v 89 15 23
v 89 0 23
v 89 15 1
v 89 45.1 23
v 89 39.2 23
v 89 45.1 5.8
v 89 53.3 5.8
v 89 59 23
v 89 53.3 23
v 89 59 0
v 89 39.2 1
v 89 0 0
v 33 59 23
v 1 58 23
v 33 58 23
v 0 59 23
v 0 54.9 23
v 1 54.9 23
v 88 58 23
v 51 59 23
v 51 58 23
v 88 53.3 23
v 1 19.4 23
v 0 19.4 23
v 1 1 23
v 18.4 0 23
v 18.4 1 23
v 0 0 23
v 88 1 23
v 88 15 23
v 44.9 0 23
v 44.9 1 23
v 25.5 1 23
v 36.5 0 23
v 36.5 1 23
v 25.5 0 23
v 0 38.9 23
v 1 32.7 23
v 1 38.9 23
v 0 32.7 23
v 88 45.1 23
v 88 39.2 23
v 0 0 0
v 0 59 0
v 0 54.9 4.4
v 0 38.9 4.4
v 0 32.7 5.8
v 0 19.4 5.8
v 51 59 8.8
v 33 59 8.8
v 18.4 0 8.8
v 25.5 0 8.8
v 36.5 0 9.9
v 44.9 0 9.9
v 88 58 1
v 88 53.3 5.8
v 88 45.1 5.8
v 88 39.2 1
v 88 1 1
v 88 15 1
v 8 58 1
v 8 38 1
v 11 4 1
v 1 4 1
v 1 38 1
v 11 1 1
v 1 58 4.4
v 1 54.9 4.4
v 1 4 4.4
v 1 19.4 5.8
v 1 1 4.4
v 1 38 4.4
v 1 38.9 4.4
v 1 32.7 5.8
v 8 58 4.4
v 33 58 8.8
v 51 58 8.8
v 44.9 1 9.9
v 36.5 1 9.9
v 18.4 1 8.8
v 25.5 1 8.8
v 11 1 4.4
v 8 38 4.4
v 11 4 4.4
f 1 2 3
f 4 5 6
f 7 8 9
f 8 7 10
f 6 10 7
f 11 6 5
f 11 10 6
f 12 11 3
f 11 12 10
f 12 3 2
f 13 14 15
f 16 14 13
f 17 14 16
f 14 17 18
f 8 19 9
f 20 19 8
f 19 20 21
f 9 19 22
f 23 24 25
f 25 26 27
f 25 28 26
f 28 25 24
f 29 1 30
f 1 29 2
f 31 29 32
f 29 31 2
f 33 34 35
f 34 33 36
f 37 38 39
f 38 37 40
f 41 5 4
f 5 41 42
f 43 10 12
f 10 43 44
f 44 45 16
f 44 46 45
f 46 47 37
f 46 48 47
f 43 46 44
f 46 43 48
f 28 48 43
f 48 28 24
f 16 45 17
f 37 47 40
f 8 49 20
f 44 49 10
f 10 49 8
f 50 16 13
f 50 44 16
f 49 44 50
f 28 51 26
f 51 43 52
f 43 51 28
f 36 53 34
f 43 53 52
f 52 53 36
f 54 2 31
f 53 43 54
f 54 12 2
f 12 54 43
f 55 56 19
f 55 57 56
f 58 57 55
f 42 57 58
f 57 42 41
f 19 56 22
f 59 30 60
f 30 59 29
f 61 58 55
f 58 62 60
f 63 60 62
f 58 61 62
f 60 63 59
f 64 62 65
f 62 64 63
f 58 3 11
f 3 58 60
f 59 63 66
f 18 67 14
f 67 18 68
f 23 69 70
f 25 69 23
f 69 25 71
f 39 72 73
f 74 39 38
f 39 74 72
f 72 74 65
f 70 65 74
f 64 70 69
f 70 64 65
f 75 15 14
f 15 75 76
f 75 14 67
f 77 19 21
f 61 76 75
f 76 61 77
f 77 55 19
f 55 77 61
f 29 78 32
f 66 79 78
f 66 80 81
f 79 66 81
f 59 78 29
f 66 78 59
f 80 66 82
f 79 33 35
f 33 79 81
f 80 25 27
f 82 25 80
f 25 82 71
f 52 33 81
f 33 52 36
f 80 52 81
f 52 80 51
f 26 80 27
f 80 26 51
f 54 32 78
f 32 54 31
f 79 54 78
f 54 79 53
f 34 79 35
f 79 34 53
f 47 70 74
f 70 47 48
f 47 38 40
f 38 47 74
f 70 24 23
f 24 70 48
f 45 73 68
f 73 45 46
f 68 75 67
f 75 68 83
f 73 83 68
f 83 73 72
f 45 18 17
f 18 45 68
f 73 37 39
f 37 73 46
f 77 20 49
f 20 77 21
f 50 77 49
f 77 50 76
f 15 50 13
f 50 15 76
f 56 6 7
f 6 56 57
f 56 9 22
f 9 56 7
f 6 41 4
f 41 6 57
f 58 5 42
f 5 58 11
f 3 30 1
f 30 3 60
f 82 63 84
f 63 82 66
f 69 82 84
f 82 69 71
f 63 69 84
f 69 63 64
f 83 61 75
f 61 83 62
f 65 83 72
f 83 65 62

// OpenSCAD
/*
 * Raspberry Pi Case
 *
 * Copyright 2012 <b@Zi.iS>
 * License CC BY 3.0
 */

base();

module base(
	wall = 1,
	height = 22,
	model = "B"
) {
	length = 87;
	width = 57;

	difference() {

		// Case
		cube([
			length + wall*2,
			width + wall*2,
			height + wall,
		]);

		// Hollow
		translate([
			wall,
			wall,
			wall
		]) {
			cube([
				length,
				width,
		 		height+1,
			]);
		}

		// Audio
		translate([
			wall+17.4,
			-wall,
			wall+3.4+4.4
		]) {
			cube([
				7.1,
				3*wall,
				50,
			]);
		}

		// Composite	
		translate([
			wall+17.4+7.1+11,
			-wall,
			wall+3.4+5.5
		]) {
			cube([
				8.4,
				3*wall,
				50,
			]);
		}
	
		// USB
		translate([
			-wall,
			wall+18.4,
			wall+3.4+1.4
		]) {
			cube([
				3*wall,
				13.3,
				50,
			]);
		}

		// Ethernet
		translate([
			-wall,
			wall+18.4+13.3+6.2,
			wall+3.4
		]) {
			cube([
				3*wall,
				16,
				50,
			]);
		}
	
		// HDMI
		translate([
			wall+32,
			width,
			wall+3.4+4.4
		]) {
			cube([
				18,
				3*wall,
				50,
			]);
		}
	
		// Power
		translate([
			length,
			wall+44.1,
			wall+3.4+1.4
		]) {
			cube([
				3*wall,
				8.2,
				50,
			]);
		}

		// SD
		translate([
			length,
			wall+14,
			wall
		]) {
			cube([
				3*wall,
				24.2,
				50,
			]);
		}
	}

	//Supports
	cube([
		wall+10,
		wall+3,
		wall+3.4,
	]);
	translate([
			0,
			width+wall-20,
			0
		]) {
			cube([
				wall+7,
				wall+20,
				wall+3.4,
		]);
	}
}
